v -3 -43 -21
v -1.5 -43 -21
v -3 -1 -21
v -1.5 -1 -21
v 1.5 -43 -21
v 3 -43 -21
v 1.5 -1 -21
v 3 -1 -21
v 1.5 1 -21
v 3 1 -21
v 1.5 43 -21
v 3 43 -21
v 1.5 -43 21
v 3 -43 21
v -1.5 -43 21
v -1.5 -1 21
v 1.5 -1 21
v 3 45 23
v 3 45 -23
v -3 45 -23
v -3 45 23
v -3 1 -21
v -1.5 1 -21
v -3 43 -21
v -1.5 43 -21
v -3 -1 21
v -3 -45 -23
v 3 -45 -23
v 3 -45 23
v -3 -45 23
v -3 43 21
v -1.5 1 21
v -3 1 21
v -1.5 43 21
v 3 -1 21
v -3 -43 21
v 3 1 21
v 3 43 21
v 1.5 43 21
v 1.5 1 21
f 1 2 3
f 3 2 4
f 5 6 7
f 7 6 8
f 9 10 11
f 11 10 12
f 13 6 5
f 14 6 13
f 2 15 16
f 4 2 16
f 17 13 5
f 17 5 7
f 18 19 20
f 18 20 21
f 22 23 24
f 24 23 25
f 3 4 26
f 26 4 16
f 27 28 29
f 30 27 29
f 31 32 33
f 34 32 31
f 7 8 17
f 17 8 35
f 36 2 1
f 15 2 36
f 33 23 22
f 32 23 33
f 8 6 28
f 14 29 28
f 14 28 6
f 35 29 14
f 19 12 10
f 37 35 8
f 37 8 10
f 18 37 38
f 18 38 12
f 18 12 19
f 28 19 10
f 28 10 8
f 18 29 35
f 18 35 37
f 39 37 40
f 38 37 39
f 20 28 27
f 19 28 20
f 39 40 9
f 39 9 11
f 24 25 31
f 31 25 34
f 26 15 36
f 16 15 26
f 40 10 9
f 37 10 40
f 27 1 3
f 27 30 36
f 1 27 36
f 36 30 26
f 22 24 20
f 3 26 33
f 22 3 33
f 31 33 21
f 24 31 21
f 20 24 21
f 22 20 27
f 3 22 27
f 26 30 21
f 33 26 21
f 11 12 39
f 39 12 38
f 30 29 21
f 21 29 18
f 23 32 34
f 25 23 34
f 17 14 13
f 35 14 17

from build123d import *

# Parameters (mm, degrees)
F0_W     = 90
F0_H     = 46
F1_DEPTH = 3
F3_START = -4.5
F2_W     = 42
F2_H     = 42
F3_DEPTH = 1.5
F4_DEPTH = 1.5


with BuildPart() as f1:
    # F0 (on Right) → F1 (new body, symmetric)
    with BuildSketch(Plane.YZ):
        Rectangle(F0_W, F0_H)
    extrude(amount=F1_DEPTH, both=True)

    # F2 (on face) → F3 (cut)
    with BuildSketch(Plane.YZ.offset(3).offset(F3_START)):
        with Locations((-22, 0)):
            Rectangle(F2_W, F2_H)
        with Locations((22, 0)):
            Rectangle(F2_W, F2_H)
    extrude(amount=-F3_DEPTH, mode=Mode.SUBTRACT)

    # F2 (on face) → F4 (cut)
    with BuildSketch(Plane.YZ.offset(3)):
        with Locations((-22, 0)):
            Rectangle(F2_W, F2_H)
        with Locations((22, 0)):
            Rectangle(F2_W, F2_H)
    extrude(amount=-F4_DEPTH, mode=Mode.SUBTRACT)


solid = f1.part
